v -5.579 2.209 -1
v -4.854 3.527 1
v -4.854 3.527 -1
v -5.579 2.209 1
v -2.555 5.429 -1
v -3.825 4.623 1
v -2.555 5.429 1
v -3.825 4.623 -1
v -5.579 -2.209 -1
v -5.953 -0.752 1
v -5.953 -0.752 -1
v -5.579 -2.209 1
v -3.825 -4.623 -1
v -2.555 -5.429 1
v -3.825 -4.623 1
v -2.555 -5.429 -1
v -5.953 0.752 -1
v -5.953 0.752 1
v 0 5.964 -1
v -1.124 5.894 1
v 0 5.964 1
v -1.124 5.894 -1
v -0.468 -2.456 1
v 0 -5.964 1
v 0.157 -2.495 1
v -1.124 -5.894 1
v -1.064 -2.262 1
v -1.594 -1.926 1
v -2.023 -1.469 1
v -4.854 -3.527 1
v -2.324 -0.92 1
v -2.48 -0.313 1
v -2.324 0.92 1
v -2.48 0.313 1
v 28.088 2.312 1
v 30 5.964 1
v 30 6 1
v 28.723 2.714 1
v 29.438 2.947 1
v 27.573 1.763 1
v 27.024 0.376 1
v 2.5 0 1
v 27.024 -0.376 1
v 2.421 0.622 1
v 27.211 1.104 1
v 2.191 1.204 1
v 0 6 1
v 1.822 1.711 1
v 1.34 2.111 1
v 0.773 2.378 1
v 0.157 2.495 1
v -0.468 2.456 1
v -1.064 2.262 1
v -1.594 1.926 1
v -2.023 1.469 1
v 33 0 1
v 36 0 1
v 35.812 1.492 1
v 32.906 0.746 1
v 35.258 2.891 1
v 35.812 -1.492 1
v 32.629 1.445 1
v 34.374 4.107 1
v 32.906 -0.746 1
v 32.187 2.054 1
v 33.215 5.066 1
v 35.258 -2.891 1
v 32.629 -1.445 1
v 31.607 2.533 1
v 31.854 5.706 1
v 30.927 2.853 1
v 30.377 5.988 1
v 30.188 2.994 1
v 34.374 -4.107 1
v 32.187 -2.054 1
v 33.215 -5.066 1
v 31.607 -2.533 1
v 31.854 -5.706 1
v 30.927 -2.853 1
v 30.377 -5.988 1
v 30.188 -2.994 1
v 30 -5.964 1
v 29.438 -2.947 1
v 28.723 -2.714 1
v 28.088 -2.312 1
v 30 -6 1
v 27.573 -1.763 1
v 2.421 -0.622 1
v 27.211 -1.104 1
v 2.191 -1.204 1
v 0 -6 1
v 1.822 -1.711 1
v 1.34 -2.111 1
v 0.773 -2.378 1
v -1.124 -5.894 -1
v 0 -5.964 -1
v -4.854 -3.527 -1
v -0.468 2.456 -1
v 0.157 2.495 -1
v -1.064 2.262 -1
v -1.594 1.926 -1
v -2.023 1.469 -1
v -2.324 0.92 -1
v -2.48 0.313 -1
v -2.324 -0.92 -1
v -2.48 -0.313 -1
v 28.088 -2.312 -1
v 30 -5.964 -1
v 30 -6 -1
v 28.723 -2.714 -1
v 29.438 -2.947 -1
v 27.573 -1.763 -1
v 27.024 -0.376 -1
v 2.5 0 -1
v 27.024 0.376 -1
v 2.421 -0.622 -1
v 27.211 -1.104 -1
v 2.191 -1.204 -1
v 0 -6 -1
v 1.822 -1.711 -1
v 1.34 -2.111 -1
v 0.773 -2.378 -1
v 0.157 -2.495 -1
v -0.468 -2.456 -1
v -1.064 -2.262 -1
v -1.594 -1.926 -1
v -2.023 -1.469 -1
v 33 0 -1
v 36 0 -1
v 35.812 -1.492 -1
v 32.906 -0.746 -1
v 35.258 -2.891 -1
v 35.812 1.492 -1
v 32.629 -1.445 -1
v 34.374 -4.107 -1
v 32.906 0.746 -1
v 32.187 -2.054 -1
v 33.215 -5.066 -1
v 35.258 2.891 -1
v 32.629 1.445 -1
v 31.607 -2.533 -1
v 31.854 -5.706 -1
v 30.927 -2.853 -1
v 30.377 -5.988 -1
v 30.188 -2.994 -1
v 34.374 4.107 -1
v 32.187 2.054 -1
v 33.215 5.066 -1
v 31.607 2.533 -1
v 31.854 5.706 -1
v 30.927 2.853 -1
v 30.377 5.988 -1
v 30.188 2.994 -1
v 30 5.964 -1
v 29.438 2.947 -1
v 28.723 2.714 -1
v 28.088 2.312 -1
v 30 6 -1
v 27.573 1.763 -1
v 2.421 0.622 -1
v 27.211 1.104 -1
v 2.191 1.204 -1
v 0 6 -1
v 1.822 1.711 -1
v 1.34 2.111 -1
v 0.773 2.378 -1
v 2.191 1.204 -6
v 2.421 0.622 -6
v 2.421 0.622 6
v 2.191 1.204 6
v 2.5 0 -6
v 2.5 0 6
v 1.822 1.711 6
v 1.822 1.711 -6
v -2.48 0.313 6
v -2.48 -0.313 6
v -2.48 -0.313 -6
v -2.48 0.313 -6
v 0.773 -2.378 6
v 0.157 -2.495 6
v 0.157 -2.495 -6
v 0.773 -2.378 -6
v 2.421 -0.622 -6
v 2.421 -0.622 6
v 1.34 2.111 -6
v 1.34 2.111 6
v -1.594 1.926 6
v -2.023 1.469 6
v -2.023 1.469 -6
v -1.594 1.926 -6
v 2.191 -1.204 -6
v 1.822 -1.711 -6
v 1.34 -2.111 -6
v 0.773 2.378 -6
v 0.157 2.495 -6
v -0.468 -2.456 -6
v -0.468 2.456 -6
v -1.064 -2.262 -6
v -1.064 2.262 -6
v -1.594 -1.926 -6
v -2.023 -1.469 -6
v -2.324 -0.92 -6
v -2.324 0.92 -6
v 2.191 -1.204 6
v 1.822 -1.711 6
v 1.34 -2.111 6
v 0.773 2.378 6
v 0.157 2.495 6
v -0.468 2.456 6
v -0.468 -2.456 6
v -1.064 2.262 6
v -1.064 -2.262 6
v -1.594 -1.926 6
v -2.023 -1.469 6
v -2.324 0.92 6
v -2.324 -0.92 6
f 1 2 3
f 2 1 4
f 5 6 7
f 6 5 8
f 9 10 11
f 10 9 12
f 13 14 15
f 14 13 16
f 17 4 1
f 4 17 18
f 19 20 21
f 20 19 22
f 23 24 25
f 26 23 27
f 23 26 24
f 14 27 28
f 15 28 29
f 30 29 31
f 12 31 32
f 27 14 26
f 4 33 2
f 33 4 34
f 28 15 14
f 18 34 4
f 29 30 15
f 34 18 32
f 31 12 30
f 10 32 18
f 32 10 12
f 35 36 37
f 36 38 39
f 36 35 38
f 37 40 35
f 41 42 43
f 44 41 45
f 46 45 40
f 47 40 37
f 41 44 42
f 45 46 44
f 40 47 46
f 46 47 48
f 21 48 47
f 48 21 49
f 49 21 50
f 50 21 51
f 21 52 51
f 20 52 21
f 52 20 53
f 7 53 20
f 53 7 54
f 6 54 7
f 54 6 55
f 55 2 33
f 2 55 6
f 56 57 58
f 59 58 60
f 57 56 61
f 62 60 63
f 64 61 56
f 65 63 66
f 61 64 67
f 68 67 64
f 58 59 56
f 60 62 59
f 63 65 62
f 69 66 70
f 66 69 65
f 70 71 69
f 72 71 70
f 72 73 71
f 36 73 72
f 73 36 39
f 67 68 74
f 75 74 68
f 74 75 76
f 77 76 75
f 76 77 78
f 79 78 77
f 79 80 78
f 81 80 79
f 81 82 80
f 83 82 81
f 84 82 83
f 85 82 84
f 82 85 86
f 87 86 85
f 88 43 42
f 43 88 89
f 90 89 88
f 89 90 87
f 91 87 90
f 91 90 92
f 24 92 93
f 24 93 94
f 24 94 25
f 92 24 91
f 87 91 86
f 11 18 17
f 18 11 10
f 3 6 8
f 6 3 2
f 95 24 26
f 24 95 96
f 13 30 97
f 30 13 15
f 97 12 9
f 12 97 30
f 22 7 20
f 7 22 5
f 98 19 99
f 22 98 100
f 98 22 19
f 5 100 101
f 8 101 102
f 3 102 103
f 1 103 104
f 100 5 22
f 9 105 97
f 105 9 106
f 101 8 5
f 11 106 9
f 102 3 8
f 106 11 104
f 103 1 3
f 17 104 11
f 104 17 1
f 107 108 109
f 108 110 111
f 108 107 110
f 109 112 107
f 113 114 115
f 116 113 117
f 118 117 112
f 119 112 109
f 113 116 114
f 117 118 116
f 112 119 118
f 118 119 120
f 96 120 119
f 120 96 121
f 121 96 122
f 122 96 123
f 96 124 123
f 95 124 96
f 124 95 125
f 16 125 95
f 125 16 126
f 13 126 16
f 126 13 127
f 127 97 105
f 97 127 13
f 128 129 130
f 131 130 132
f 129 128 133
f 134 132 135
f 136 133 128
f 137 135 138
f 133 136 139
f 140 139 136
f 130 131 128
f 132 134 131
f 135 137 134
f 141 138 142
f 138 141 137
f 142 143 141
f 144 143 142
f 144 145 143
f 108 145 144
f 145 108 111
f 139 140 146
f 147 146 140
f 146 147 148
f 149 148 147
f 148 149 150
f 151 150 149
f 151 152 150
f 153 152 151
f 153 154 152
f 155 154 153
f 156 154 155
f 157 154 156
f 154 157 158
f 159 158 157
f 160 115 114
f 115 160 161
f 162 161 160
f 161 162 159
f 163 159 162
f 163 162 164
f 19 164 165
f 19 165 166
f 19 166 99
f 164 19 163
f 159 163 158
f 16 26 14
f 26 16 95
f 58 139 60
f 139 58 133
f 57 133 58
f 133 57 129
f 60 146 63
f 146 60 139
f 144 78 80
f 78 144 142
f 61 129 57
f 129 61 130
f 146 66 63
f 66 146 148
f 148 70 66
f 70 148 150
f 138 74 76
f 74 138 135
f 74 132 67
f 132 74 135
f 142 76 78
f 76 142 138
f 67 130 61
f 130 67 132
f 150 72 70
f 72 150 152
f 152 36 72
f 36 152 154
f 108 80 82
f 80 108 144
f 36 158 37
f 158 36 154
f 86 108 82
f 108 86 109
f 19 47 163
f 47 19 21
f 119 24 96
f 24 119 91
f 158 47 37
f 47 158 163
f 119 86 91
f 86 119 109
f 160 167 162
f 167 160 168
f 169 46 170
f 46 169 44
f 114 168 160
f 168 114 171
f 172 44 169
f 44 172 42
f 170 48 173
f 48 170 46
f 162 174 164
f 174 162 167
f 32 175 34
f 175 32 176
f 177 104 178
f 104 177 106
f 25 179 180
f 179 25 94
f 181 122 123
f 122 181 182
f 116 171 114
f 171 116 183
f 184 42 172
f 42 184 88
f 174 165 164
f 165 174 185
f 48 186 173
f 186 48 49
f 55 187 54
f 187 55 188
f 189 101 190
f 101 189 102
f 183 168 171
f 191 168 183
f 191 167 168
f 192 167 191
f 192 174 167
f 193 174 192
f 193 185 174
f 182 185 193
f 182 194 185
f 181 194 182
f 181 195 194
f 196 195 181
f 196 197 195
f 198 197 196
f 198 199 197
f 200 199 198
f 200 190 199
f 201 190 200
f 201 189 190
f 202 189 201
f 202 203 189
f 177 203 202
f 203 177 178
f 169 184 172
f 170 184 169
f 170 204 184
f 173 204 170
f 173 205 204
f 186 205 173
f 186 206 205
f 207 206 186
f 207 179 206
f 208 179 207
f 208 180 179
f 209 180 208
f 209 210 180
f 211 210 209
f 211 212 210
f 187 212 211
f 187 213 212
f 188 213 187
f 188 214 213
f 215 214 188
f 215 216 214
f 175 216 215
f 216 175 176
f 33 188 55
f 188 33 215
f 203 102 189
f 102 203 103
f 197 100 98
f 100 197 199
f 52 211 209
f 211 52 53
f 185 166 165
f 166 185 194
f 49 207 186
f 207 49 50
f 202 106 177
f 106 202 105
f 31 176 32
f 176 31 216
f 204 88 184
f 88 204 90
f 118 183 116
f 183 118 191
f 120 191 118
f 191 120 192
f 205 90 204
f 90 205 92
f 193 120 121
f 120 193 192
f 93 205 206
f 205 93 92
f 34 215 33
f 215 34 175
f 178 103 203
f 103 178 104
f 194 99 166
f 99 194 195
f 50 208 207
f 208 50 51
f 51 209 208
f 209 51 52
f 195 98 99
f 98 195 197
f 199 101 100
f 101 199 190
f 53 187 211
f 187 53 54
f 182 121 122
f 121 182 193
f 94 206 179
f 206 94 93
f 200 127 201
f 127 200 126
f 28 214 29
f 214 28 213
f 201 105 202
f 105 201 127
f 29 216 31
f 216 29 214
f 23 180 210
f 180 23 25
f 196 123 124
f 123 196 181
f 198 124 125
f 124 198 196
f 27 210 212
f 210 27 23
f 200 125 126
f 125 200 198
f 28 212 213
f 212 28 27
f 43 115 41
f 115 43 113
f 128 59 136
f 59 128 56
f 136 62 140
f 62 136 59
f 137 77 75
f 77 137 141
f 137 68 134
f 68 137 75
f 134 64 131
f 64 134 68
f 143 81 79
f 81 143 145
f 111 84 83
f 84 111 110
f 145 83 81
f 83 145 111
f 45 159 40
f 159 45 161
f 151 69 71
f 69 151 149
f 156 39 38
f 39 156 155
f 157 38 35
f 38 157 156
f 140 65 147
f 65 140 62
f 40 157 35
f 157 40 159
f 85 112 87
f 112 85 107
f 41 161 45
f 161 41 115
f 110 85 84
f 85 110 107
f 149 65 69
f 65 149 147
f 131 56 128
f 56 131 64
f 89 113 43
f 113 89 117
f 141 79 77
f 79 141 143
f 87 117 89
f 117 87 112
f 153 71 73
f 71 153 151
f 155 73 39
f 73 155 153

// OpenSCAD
quality=25;

pin_radius=2.5;
pin_length=12;

hole_radius=3;
backing_thickness=2;
bit_distance=30;


//backing
difference()
{
union()
{
translate([0,0,-backing_thickness/2]) union()
{
    cylinder(r=hole_radius*2,h=backing_thickness,$fn=quality);
    translate([bit_distance,0,0]) cylinder(r=hole_radius*2,h=backing_thickness,$fn=quality);
    translate([0,-hole_radius*2,0]) cube([bit_distance,hole_radius*4,backing_thickness]);  
}
translate([0,0,-pin_length/2]) cylinder(r=pin_radius,h=pin_length,$fn=quality);
}
translate([bit_distance,0,-backing_thickness/2]) cylinder(r=hole_radius,h=backing_thickness,$fn=quality);
}
